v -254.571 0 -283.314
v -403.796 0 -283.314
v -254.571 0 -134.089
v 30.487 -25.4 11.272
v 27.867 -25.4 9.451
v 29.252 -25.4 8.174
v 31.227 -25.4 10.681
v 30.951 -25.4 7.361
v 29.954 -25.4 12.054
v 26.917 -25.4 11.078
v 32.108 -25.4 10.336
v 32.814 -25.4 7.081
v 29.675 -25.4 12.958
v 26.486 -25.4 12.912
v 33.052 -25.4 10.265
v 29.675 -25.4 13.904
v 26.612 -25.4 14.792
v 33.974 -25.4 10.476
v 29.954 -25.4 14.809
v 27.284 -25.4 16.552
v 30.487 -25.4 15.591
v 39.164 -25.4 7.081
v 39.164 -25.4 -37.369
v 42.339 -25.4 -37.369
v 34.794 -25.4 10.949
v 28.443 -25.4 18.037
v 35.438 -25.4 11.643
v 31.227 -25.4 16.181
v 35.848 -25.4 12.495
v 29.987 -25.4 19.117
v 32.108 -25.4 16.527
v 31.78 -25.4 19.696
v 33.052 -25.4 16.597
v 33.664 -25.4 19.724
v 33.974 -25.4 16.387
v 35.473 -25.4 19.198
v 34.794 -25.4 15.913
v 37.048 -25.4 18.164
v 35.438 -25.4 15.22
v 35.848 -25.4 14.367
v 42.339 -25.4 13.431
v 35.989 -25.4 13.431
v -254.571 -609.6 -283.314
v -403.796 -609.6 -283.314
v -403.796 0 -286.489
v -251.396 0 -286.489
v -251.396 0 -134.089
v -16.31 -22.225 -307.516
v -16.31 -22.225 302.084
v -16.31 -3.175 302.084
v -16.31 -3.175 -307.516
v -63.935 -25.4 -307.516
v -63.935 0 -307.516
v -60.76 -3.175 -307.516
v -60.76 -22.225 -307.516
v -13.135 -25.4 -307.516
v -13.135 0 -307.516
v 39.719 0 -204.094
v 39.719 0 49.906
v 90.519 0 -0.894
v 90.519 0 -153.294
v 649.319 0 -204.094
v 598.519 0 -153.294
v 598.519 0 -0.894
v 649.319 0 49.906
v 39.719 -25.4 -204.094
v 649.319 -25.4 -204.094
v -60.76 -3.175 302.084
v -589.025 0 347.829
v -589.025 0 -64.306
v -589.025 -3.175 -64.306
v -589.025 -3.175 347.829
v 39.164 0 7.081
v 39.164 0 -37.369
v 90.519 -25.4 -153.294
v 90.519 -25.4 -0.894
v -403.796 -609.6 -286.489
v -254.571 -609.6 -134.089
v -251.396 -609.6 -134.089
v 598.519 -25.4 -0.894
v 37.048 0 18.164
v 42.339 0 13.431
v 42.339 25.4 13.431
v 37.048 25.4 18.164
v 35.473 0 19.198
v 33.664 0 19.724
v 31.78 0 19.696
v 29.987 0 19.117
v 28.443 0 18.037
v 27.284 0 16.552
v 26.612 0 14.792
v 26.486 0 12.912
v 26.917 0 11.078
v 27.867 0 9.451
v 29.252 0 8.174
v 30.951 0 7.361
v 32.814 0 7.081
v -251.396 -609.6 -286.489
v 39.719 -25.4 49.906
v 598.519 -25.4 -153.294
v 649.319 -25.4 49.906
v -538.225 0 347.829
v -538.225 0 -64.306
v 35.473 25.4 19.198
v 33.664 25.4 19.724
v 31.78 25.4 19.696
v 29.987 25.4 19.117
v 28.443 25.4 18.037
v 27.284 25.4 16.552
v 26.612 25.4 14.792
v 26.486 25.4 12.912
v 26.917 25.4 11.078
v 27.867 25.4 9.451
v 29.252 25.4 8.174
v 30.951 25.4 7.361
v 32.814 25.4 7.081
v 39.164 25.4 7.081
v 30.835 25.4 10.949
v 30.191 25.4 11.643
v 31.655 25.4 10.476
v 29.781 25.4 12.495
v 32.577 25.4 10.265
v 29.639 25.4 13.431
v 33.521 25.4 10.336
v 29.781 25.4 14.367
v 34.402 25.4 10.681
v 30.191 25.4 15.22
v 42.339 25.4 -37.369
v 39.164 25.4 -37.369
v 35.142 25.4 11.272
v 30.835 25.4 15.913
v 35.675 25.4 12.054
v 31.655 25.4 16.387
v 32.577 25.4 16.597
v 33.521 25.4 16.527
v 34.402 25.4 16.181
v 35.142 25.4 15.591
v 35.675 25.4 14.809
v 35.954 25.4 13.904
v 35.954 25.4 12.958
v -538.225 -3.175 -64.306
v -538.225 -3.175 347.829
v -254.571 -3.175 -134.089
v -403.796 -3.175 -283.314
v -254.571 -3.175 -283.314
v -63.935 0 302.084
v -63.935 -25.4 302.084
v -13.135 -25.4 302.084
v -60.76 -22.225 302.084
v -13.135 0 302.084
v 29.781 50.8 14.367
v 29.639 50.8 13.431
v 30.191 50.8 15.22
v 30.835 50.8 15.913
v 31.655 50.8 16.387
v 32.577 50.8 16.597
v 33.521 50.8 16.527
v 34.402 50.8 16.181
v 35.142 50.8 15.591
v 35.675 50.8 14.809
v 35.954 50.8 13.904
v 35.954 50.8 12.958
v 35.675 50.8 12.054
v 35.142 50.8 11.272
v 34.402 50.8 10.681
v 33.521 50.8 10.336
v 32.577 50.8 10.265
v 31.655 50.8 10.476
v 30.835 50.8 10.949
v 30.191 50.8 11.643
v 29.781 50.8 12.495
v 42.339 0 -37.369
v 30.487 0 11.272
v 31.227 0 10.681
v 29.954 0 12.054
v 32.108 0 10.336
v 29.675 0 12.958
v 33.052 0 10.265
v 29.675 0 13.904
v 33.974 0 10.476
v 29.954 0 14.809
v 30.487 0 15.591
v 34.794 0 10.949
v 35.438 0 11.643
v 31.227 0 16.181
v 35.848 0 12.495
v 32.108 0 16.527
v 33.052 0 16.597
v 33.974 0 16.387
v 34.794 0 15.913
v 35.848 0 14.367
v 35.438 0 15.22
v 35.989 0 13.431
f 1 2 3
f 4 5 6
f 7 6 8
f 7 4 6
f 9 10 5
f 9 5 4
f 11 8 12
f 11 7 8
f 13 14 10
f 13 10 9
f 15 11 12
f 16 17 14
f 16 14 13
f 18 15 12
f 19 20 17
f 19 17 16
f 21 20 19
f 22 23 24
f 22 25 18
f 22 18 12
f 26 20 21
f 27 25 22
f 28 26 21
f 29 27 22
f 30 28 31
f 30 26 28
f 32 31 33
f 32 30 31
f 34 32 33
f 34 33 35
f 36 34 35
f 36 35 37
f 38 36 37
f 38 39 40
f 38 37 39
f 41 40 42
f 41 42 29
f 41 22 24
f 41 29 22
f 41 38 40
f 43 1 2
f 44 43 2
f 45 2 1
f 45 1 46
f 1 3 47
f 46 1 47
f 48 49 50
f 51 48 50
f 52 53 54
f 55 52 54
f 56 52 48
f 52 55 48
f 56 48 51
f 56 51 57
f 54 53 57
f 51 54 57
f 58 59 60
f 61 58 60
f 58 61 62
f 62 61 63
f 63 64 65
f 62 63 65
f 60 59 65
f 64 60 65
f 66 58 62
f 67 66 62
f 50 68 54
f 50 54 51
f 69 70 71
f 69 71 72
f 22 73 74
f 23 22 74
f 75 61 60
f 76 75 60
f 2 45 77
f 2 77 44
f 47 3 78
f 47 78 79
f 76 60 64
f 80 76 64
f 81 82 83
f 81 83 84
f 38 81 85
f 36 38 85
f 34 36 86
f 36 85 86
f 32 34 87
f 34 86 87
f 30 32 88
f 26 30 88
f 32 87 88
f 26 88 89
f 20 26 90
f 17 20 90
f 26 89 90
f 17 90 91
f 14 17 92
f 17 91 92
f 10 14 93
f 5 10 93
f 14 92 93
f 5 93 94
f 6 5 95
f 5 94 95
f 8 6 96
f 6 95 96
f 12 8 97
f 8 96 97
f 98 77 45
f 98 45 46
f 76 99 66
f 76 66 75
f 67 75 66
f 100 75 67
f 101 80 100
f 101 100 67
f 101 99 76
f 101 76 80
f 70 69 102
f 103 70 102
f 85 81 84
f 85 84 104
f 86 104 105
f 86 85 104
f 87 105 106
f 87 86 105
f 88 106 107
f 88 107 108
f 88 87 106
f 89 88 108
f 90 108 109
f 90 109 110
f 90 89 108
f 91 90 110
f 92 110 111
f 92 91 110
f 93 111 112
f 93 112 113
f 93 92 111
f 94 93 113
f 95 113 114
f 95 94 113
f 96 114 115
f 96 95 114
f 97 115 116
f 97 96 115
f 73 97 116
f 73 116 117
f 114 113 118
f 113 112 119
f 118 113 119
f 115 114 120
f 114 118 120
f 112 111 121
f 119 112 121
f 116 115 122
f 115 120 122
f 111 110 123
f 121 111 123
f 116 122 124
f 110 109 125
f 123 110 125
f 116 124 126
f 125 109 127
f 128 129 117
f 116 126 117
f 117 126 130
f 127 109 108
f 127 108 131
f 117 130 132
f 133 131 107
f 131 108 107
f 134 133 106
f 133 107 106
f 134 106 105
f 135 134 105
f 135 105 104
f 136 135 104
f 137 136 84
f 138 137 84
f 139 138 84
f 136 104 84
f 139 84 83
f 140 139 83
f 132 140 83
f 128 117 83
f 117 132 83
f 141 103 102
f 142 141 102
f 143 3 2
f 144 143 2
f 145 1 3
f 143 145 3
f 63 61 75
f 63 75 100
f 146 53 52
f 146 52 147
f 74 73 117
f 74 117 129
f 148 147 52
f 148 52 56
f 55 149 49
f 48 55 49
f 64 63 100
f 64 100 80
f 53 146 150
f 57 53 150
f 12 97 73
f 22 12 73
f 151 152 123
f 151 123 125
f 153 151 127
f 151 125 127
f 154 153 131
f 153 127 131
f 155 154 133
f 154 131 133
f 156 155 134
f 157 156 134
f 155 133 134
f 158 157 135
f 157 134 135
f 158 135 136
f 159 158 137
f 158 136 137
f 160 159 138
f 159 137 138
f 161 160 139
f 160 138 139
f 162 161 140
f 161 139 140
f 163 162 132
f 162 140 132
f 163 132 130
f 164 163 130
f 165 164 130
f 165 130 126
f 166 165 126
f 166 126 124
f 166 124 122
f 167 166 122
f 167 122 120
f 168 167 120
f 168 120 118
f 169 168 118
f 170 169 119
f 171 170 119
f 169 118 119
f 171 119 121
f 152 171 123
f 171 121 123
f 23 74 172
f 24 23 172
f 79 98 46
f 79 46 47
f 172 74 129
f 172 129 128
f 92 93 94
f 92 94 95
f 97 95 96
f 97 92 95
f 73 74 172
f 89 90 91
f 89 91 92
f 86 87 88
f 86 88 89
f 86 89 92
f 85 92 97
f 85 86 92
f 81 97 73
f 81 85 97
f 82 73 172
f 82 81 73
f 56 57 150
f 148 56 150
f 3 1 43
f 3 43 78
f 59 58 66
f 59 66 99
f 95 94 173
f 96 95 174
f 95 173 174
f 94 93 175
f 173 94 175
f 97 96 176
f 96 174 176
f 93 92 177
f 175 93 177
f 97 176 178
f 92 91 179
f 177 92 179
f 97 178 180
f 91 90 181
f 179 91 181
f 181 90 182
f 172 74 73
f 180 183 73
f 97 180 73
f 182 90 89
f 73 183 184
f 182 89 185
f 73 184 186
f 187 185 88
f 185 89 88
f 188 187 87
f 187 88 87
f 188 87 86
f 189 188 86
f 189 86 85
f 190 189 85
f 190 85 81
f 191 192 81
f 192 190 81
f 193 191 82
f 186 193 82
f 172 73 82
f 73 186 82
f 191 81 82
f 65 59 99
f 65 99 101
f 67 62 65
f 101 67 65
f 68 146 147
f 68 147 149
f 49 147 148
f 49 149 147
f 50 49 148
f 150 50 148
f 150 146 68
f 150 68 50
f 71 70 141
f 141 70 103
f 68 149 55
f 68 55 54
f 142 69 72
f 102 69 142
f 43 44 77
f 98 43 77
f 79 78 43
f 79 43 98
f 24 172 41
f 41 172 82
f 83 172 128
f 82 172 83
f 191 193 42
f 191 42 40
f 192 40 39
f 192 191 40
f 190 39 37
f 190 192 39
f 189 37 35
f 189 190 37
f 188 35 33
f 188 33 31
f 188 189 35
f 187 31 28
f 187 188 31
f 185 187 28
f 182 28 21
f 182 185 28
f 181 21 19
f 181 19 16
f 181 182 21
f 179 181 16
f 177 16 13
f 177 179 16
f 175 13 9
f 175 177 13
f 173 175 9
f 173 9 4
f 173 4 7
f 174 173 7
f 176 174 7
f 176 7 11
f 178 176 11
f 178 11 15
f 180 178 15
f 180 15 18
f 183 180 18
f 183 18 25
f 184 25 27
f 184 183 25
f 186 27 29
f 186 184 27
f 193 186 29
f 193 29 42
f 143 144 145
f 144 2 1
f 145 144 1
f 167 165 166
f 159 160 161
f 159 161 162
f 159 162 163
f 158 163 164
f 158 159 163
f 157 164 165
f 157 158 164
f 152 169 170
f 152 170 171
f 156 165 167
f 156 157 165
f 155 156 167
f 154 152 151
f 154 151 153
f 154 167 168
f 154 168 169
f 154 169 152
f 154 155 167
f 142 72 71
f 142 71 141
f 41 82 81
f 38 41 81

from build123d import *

# Parameters (mm, degrees)
F0_W      = 149.225
F0_H      = 3.175
F0_W_2    = 3.175
F0_H_2    = 149.225
F1_DEPTH  = 609.6
F2_DEPTH  = 3.175
F3_R      = 3.175
F4_DEPTH  = 25.4
F5_DEPTH  = 25.4
F6_R      = 3.175
F7_DEPTH  = 25.4
F8_W      = 50.8
F8_H      = 609.6
F9_DEPTH  = 25.4
F10_W     = 44.45
F10_H     = 19.05
F11_DEPTH = 609.601
F12_W     = 609.6
F12_H     = 254
F12_W_2   = 508
F12_H_2   = 152.4
F13_DEPTH = 25.4
F14_W     = 50.8
F14_H     = 412.135066
F15_DEPTH = 3.175


with BuildPart() as f1:
    # F0 (on Front) → F1 (new body)
    with BuildSketch(Plane.XZ):
        with Locations((-329.183801, -284.901469)):
            Rectangle(F0_W, F0_H)
        with Locations((-252.983801, -284.901469)):
            Rectangle(F0_W_2, F0_H)
        with Locations((-252.983801, -208.701469)):
            Rectangle(F0_W_2, F0_H_2)
    extrude(amount=F1_DEPTH)


with BuildPart() as f2:
    # F0 (on Front) → F2 (new body)
    with BuildSketch(Plane.XZ):
        Polygon((-254.571301, -134.088969), (-403.796301, -283.313969), (-254.571301, -283.313969), align=None)
    extrude(amount=F2_DEPTH)


with BuildPart() as f4:
    # F3 (on Front) → F4 (new body)
    with BuildSketch(Plane.XZ):
        with BuildLine():
            ThreePointArc((32.814461, 7.081124), (37.304589, 8.940996), (39.164461, 13.431124))
            ThreePointArc((39.164461, 13.431124), (38.611191, 16.0235), (37.047794, 18.164134))
            ThreePointArc((37.047794, 18.164134), (26.882466, 15.696944), (32.814461, 7.081124))
        make_face()
        with Locations((32.814461, 13.431124)):
            Circle(F3_R, mode=Mode.SUBTRACT)
        with BuildLine():
            ThreePointArc((37.047794, 18.164134), (38.611191, 16.0235), (39.164461, 13.431124))
            Line((39.164461, 13.431124), (42.339461, 13.431124))
            Line((42.339461, 13.431124), (37.047794, 18.164134))
        make_face()
        with BuildLine():
            Line((39.164461, 7.081124), (39.164461, 13.431124))
            ThreePointArc((39.164461, 13.431124), (37.304589, 8.940996), (32.814461, 7.081124))
            Line((32.814461, 7.081124), (39.164461, 7.081124))
        make_face()
        Polygon((42.339461, 13.431124), (39.164461, 13.431124), (39.164461, 7.081124), (39.164461, -37.368876), (42.339461, -37.368876), align=None)
    extrude(amount=F4_DEPTH)


with BuildPart() as f5:
    # F3 (on Front) → F5 (new body)
    with BuildSketch(Plane.XZ):
        Polygon((42.339461, 13.431124), (39.164461, 13.431124), (39.164461, 7.081124), (39.164461, -37.368876), (42.339461, -37.368876), align=None)
        with BuildLine():
            Line((39.164461, 7.081124), (39.164461, 13.431124))
            ThreePointArc((39.164461, 13.431124), (37.304589, 8.940996), (32.814461, 7.081124))
            Line((32.814461, 7.081124), (39.164461, 7.081124))
        make_face()
        with BuildLine():
            ThreePointArc((37.047794, 18.164134), (38.611191, 16.0235), (39.164461, 13.431124))
            Line((39.164461, 13.431124), (42.339461, 13.431124))
            Line((42.339461, 13.431124), (37.047794, 18.164134))
        make_face()
        with BuildLine():
            ThreePointArc((32.814461, 7.081124), (37.304589, 8.940996), (39.164461, 13.431124))
            ThreePointArc((39.164461, 13.431124), (38.611191, 16.0235), (37.047794, 18.164134))
            ThreePointArc((37.047794, 18.164134), (26.882466, 15.696944), (32.814461, 7.081124))
        make_face()
        with Locations((32.814461, 13.431124)):
            Circle(F3_R, mode=Mode.SUBTRACT)
        with Locations((32.814461, 13.431124)):
            Circle(F3_R)
    extrude(amount=-F5_DEPTH)

    # F6 (on face) → F7 (join)
    with BuildSketch(Plane(origin=(0, 25.4, 0), x_dir=(-1, 0, 0), z_dir=(0, 1, 0))):
        with Locations((-32.814461, 13.431124)):
            Circle(F6_R)
    extrude(amount=F7_DEPTH)


with BuildPart() as f9:
    # F8 (on Front) → F9 (new body)
    with BuildSketch(Plane.XZ):
        with Locations((-38.534949, -2.715807)):
            Rectangle(F8_W, F8_H)
    extrude(amount=F9_DEPTH)

    # F10 (on face) → F11 (cut, through all)
    with BuildSketch(Plane.XY.offset(302.084193)):
        with Locations((-38.534949, -12.7)):
            Rectangle(F10_W, F10_H)
    extrude(amount=-F11_DEPTH, mode=Mode.SUBTRACT)


with BuildPart() as f13:
    # F12 (on Front) → F13 (new body)
    with BuildSketch(Plane.XZ):
        with Locations((344.518735, -77.093654)):
            Rectangle(F12_W, F12_H)
        with Locations((344.518735, -77.093654)):
            Rectangle(F12_W_2, F12_H_2, mode=Mode.SUBTRACT)
    extrude(amount=F13_DEPTH)


with BuildPart() as f15:
    # F14 (on Front) → F15 (new body)
    with BuildSketch(Plane.XZ):
        with Locations((-563.624591, 141.761065)):
            Rectangle(F14_W, F14_H)
    extrude(amount=F15_DEPTH)


solid = Compound([f1.part, f2.part, f4.part, f5.part, f9.part, f13.part, f15.part])
